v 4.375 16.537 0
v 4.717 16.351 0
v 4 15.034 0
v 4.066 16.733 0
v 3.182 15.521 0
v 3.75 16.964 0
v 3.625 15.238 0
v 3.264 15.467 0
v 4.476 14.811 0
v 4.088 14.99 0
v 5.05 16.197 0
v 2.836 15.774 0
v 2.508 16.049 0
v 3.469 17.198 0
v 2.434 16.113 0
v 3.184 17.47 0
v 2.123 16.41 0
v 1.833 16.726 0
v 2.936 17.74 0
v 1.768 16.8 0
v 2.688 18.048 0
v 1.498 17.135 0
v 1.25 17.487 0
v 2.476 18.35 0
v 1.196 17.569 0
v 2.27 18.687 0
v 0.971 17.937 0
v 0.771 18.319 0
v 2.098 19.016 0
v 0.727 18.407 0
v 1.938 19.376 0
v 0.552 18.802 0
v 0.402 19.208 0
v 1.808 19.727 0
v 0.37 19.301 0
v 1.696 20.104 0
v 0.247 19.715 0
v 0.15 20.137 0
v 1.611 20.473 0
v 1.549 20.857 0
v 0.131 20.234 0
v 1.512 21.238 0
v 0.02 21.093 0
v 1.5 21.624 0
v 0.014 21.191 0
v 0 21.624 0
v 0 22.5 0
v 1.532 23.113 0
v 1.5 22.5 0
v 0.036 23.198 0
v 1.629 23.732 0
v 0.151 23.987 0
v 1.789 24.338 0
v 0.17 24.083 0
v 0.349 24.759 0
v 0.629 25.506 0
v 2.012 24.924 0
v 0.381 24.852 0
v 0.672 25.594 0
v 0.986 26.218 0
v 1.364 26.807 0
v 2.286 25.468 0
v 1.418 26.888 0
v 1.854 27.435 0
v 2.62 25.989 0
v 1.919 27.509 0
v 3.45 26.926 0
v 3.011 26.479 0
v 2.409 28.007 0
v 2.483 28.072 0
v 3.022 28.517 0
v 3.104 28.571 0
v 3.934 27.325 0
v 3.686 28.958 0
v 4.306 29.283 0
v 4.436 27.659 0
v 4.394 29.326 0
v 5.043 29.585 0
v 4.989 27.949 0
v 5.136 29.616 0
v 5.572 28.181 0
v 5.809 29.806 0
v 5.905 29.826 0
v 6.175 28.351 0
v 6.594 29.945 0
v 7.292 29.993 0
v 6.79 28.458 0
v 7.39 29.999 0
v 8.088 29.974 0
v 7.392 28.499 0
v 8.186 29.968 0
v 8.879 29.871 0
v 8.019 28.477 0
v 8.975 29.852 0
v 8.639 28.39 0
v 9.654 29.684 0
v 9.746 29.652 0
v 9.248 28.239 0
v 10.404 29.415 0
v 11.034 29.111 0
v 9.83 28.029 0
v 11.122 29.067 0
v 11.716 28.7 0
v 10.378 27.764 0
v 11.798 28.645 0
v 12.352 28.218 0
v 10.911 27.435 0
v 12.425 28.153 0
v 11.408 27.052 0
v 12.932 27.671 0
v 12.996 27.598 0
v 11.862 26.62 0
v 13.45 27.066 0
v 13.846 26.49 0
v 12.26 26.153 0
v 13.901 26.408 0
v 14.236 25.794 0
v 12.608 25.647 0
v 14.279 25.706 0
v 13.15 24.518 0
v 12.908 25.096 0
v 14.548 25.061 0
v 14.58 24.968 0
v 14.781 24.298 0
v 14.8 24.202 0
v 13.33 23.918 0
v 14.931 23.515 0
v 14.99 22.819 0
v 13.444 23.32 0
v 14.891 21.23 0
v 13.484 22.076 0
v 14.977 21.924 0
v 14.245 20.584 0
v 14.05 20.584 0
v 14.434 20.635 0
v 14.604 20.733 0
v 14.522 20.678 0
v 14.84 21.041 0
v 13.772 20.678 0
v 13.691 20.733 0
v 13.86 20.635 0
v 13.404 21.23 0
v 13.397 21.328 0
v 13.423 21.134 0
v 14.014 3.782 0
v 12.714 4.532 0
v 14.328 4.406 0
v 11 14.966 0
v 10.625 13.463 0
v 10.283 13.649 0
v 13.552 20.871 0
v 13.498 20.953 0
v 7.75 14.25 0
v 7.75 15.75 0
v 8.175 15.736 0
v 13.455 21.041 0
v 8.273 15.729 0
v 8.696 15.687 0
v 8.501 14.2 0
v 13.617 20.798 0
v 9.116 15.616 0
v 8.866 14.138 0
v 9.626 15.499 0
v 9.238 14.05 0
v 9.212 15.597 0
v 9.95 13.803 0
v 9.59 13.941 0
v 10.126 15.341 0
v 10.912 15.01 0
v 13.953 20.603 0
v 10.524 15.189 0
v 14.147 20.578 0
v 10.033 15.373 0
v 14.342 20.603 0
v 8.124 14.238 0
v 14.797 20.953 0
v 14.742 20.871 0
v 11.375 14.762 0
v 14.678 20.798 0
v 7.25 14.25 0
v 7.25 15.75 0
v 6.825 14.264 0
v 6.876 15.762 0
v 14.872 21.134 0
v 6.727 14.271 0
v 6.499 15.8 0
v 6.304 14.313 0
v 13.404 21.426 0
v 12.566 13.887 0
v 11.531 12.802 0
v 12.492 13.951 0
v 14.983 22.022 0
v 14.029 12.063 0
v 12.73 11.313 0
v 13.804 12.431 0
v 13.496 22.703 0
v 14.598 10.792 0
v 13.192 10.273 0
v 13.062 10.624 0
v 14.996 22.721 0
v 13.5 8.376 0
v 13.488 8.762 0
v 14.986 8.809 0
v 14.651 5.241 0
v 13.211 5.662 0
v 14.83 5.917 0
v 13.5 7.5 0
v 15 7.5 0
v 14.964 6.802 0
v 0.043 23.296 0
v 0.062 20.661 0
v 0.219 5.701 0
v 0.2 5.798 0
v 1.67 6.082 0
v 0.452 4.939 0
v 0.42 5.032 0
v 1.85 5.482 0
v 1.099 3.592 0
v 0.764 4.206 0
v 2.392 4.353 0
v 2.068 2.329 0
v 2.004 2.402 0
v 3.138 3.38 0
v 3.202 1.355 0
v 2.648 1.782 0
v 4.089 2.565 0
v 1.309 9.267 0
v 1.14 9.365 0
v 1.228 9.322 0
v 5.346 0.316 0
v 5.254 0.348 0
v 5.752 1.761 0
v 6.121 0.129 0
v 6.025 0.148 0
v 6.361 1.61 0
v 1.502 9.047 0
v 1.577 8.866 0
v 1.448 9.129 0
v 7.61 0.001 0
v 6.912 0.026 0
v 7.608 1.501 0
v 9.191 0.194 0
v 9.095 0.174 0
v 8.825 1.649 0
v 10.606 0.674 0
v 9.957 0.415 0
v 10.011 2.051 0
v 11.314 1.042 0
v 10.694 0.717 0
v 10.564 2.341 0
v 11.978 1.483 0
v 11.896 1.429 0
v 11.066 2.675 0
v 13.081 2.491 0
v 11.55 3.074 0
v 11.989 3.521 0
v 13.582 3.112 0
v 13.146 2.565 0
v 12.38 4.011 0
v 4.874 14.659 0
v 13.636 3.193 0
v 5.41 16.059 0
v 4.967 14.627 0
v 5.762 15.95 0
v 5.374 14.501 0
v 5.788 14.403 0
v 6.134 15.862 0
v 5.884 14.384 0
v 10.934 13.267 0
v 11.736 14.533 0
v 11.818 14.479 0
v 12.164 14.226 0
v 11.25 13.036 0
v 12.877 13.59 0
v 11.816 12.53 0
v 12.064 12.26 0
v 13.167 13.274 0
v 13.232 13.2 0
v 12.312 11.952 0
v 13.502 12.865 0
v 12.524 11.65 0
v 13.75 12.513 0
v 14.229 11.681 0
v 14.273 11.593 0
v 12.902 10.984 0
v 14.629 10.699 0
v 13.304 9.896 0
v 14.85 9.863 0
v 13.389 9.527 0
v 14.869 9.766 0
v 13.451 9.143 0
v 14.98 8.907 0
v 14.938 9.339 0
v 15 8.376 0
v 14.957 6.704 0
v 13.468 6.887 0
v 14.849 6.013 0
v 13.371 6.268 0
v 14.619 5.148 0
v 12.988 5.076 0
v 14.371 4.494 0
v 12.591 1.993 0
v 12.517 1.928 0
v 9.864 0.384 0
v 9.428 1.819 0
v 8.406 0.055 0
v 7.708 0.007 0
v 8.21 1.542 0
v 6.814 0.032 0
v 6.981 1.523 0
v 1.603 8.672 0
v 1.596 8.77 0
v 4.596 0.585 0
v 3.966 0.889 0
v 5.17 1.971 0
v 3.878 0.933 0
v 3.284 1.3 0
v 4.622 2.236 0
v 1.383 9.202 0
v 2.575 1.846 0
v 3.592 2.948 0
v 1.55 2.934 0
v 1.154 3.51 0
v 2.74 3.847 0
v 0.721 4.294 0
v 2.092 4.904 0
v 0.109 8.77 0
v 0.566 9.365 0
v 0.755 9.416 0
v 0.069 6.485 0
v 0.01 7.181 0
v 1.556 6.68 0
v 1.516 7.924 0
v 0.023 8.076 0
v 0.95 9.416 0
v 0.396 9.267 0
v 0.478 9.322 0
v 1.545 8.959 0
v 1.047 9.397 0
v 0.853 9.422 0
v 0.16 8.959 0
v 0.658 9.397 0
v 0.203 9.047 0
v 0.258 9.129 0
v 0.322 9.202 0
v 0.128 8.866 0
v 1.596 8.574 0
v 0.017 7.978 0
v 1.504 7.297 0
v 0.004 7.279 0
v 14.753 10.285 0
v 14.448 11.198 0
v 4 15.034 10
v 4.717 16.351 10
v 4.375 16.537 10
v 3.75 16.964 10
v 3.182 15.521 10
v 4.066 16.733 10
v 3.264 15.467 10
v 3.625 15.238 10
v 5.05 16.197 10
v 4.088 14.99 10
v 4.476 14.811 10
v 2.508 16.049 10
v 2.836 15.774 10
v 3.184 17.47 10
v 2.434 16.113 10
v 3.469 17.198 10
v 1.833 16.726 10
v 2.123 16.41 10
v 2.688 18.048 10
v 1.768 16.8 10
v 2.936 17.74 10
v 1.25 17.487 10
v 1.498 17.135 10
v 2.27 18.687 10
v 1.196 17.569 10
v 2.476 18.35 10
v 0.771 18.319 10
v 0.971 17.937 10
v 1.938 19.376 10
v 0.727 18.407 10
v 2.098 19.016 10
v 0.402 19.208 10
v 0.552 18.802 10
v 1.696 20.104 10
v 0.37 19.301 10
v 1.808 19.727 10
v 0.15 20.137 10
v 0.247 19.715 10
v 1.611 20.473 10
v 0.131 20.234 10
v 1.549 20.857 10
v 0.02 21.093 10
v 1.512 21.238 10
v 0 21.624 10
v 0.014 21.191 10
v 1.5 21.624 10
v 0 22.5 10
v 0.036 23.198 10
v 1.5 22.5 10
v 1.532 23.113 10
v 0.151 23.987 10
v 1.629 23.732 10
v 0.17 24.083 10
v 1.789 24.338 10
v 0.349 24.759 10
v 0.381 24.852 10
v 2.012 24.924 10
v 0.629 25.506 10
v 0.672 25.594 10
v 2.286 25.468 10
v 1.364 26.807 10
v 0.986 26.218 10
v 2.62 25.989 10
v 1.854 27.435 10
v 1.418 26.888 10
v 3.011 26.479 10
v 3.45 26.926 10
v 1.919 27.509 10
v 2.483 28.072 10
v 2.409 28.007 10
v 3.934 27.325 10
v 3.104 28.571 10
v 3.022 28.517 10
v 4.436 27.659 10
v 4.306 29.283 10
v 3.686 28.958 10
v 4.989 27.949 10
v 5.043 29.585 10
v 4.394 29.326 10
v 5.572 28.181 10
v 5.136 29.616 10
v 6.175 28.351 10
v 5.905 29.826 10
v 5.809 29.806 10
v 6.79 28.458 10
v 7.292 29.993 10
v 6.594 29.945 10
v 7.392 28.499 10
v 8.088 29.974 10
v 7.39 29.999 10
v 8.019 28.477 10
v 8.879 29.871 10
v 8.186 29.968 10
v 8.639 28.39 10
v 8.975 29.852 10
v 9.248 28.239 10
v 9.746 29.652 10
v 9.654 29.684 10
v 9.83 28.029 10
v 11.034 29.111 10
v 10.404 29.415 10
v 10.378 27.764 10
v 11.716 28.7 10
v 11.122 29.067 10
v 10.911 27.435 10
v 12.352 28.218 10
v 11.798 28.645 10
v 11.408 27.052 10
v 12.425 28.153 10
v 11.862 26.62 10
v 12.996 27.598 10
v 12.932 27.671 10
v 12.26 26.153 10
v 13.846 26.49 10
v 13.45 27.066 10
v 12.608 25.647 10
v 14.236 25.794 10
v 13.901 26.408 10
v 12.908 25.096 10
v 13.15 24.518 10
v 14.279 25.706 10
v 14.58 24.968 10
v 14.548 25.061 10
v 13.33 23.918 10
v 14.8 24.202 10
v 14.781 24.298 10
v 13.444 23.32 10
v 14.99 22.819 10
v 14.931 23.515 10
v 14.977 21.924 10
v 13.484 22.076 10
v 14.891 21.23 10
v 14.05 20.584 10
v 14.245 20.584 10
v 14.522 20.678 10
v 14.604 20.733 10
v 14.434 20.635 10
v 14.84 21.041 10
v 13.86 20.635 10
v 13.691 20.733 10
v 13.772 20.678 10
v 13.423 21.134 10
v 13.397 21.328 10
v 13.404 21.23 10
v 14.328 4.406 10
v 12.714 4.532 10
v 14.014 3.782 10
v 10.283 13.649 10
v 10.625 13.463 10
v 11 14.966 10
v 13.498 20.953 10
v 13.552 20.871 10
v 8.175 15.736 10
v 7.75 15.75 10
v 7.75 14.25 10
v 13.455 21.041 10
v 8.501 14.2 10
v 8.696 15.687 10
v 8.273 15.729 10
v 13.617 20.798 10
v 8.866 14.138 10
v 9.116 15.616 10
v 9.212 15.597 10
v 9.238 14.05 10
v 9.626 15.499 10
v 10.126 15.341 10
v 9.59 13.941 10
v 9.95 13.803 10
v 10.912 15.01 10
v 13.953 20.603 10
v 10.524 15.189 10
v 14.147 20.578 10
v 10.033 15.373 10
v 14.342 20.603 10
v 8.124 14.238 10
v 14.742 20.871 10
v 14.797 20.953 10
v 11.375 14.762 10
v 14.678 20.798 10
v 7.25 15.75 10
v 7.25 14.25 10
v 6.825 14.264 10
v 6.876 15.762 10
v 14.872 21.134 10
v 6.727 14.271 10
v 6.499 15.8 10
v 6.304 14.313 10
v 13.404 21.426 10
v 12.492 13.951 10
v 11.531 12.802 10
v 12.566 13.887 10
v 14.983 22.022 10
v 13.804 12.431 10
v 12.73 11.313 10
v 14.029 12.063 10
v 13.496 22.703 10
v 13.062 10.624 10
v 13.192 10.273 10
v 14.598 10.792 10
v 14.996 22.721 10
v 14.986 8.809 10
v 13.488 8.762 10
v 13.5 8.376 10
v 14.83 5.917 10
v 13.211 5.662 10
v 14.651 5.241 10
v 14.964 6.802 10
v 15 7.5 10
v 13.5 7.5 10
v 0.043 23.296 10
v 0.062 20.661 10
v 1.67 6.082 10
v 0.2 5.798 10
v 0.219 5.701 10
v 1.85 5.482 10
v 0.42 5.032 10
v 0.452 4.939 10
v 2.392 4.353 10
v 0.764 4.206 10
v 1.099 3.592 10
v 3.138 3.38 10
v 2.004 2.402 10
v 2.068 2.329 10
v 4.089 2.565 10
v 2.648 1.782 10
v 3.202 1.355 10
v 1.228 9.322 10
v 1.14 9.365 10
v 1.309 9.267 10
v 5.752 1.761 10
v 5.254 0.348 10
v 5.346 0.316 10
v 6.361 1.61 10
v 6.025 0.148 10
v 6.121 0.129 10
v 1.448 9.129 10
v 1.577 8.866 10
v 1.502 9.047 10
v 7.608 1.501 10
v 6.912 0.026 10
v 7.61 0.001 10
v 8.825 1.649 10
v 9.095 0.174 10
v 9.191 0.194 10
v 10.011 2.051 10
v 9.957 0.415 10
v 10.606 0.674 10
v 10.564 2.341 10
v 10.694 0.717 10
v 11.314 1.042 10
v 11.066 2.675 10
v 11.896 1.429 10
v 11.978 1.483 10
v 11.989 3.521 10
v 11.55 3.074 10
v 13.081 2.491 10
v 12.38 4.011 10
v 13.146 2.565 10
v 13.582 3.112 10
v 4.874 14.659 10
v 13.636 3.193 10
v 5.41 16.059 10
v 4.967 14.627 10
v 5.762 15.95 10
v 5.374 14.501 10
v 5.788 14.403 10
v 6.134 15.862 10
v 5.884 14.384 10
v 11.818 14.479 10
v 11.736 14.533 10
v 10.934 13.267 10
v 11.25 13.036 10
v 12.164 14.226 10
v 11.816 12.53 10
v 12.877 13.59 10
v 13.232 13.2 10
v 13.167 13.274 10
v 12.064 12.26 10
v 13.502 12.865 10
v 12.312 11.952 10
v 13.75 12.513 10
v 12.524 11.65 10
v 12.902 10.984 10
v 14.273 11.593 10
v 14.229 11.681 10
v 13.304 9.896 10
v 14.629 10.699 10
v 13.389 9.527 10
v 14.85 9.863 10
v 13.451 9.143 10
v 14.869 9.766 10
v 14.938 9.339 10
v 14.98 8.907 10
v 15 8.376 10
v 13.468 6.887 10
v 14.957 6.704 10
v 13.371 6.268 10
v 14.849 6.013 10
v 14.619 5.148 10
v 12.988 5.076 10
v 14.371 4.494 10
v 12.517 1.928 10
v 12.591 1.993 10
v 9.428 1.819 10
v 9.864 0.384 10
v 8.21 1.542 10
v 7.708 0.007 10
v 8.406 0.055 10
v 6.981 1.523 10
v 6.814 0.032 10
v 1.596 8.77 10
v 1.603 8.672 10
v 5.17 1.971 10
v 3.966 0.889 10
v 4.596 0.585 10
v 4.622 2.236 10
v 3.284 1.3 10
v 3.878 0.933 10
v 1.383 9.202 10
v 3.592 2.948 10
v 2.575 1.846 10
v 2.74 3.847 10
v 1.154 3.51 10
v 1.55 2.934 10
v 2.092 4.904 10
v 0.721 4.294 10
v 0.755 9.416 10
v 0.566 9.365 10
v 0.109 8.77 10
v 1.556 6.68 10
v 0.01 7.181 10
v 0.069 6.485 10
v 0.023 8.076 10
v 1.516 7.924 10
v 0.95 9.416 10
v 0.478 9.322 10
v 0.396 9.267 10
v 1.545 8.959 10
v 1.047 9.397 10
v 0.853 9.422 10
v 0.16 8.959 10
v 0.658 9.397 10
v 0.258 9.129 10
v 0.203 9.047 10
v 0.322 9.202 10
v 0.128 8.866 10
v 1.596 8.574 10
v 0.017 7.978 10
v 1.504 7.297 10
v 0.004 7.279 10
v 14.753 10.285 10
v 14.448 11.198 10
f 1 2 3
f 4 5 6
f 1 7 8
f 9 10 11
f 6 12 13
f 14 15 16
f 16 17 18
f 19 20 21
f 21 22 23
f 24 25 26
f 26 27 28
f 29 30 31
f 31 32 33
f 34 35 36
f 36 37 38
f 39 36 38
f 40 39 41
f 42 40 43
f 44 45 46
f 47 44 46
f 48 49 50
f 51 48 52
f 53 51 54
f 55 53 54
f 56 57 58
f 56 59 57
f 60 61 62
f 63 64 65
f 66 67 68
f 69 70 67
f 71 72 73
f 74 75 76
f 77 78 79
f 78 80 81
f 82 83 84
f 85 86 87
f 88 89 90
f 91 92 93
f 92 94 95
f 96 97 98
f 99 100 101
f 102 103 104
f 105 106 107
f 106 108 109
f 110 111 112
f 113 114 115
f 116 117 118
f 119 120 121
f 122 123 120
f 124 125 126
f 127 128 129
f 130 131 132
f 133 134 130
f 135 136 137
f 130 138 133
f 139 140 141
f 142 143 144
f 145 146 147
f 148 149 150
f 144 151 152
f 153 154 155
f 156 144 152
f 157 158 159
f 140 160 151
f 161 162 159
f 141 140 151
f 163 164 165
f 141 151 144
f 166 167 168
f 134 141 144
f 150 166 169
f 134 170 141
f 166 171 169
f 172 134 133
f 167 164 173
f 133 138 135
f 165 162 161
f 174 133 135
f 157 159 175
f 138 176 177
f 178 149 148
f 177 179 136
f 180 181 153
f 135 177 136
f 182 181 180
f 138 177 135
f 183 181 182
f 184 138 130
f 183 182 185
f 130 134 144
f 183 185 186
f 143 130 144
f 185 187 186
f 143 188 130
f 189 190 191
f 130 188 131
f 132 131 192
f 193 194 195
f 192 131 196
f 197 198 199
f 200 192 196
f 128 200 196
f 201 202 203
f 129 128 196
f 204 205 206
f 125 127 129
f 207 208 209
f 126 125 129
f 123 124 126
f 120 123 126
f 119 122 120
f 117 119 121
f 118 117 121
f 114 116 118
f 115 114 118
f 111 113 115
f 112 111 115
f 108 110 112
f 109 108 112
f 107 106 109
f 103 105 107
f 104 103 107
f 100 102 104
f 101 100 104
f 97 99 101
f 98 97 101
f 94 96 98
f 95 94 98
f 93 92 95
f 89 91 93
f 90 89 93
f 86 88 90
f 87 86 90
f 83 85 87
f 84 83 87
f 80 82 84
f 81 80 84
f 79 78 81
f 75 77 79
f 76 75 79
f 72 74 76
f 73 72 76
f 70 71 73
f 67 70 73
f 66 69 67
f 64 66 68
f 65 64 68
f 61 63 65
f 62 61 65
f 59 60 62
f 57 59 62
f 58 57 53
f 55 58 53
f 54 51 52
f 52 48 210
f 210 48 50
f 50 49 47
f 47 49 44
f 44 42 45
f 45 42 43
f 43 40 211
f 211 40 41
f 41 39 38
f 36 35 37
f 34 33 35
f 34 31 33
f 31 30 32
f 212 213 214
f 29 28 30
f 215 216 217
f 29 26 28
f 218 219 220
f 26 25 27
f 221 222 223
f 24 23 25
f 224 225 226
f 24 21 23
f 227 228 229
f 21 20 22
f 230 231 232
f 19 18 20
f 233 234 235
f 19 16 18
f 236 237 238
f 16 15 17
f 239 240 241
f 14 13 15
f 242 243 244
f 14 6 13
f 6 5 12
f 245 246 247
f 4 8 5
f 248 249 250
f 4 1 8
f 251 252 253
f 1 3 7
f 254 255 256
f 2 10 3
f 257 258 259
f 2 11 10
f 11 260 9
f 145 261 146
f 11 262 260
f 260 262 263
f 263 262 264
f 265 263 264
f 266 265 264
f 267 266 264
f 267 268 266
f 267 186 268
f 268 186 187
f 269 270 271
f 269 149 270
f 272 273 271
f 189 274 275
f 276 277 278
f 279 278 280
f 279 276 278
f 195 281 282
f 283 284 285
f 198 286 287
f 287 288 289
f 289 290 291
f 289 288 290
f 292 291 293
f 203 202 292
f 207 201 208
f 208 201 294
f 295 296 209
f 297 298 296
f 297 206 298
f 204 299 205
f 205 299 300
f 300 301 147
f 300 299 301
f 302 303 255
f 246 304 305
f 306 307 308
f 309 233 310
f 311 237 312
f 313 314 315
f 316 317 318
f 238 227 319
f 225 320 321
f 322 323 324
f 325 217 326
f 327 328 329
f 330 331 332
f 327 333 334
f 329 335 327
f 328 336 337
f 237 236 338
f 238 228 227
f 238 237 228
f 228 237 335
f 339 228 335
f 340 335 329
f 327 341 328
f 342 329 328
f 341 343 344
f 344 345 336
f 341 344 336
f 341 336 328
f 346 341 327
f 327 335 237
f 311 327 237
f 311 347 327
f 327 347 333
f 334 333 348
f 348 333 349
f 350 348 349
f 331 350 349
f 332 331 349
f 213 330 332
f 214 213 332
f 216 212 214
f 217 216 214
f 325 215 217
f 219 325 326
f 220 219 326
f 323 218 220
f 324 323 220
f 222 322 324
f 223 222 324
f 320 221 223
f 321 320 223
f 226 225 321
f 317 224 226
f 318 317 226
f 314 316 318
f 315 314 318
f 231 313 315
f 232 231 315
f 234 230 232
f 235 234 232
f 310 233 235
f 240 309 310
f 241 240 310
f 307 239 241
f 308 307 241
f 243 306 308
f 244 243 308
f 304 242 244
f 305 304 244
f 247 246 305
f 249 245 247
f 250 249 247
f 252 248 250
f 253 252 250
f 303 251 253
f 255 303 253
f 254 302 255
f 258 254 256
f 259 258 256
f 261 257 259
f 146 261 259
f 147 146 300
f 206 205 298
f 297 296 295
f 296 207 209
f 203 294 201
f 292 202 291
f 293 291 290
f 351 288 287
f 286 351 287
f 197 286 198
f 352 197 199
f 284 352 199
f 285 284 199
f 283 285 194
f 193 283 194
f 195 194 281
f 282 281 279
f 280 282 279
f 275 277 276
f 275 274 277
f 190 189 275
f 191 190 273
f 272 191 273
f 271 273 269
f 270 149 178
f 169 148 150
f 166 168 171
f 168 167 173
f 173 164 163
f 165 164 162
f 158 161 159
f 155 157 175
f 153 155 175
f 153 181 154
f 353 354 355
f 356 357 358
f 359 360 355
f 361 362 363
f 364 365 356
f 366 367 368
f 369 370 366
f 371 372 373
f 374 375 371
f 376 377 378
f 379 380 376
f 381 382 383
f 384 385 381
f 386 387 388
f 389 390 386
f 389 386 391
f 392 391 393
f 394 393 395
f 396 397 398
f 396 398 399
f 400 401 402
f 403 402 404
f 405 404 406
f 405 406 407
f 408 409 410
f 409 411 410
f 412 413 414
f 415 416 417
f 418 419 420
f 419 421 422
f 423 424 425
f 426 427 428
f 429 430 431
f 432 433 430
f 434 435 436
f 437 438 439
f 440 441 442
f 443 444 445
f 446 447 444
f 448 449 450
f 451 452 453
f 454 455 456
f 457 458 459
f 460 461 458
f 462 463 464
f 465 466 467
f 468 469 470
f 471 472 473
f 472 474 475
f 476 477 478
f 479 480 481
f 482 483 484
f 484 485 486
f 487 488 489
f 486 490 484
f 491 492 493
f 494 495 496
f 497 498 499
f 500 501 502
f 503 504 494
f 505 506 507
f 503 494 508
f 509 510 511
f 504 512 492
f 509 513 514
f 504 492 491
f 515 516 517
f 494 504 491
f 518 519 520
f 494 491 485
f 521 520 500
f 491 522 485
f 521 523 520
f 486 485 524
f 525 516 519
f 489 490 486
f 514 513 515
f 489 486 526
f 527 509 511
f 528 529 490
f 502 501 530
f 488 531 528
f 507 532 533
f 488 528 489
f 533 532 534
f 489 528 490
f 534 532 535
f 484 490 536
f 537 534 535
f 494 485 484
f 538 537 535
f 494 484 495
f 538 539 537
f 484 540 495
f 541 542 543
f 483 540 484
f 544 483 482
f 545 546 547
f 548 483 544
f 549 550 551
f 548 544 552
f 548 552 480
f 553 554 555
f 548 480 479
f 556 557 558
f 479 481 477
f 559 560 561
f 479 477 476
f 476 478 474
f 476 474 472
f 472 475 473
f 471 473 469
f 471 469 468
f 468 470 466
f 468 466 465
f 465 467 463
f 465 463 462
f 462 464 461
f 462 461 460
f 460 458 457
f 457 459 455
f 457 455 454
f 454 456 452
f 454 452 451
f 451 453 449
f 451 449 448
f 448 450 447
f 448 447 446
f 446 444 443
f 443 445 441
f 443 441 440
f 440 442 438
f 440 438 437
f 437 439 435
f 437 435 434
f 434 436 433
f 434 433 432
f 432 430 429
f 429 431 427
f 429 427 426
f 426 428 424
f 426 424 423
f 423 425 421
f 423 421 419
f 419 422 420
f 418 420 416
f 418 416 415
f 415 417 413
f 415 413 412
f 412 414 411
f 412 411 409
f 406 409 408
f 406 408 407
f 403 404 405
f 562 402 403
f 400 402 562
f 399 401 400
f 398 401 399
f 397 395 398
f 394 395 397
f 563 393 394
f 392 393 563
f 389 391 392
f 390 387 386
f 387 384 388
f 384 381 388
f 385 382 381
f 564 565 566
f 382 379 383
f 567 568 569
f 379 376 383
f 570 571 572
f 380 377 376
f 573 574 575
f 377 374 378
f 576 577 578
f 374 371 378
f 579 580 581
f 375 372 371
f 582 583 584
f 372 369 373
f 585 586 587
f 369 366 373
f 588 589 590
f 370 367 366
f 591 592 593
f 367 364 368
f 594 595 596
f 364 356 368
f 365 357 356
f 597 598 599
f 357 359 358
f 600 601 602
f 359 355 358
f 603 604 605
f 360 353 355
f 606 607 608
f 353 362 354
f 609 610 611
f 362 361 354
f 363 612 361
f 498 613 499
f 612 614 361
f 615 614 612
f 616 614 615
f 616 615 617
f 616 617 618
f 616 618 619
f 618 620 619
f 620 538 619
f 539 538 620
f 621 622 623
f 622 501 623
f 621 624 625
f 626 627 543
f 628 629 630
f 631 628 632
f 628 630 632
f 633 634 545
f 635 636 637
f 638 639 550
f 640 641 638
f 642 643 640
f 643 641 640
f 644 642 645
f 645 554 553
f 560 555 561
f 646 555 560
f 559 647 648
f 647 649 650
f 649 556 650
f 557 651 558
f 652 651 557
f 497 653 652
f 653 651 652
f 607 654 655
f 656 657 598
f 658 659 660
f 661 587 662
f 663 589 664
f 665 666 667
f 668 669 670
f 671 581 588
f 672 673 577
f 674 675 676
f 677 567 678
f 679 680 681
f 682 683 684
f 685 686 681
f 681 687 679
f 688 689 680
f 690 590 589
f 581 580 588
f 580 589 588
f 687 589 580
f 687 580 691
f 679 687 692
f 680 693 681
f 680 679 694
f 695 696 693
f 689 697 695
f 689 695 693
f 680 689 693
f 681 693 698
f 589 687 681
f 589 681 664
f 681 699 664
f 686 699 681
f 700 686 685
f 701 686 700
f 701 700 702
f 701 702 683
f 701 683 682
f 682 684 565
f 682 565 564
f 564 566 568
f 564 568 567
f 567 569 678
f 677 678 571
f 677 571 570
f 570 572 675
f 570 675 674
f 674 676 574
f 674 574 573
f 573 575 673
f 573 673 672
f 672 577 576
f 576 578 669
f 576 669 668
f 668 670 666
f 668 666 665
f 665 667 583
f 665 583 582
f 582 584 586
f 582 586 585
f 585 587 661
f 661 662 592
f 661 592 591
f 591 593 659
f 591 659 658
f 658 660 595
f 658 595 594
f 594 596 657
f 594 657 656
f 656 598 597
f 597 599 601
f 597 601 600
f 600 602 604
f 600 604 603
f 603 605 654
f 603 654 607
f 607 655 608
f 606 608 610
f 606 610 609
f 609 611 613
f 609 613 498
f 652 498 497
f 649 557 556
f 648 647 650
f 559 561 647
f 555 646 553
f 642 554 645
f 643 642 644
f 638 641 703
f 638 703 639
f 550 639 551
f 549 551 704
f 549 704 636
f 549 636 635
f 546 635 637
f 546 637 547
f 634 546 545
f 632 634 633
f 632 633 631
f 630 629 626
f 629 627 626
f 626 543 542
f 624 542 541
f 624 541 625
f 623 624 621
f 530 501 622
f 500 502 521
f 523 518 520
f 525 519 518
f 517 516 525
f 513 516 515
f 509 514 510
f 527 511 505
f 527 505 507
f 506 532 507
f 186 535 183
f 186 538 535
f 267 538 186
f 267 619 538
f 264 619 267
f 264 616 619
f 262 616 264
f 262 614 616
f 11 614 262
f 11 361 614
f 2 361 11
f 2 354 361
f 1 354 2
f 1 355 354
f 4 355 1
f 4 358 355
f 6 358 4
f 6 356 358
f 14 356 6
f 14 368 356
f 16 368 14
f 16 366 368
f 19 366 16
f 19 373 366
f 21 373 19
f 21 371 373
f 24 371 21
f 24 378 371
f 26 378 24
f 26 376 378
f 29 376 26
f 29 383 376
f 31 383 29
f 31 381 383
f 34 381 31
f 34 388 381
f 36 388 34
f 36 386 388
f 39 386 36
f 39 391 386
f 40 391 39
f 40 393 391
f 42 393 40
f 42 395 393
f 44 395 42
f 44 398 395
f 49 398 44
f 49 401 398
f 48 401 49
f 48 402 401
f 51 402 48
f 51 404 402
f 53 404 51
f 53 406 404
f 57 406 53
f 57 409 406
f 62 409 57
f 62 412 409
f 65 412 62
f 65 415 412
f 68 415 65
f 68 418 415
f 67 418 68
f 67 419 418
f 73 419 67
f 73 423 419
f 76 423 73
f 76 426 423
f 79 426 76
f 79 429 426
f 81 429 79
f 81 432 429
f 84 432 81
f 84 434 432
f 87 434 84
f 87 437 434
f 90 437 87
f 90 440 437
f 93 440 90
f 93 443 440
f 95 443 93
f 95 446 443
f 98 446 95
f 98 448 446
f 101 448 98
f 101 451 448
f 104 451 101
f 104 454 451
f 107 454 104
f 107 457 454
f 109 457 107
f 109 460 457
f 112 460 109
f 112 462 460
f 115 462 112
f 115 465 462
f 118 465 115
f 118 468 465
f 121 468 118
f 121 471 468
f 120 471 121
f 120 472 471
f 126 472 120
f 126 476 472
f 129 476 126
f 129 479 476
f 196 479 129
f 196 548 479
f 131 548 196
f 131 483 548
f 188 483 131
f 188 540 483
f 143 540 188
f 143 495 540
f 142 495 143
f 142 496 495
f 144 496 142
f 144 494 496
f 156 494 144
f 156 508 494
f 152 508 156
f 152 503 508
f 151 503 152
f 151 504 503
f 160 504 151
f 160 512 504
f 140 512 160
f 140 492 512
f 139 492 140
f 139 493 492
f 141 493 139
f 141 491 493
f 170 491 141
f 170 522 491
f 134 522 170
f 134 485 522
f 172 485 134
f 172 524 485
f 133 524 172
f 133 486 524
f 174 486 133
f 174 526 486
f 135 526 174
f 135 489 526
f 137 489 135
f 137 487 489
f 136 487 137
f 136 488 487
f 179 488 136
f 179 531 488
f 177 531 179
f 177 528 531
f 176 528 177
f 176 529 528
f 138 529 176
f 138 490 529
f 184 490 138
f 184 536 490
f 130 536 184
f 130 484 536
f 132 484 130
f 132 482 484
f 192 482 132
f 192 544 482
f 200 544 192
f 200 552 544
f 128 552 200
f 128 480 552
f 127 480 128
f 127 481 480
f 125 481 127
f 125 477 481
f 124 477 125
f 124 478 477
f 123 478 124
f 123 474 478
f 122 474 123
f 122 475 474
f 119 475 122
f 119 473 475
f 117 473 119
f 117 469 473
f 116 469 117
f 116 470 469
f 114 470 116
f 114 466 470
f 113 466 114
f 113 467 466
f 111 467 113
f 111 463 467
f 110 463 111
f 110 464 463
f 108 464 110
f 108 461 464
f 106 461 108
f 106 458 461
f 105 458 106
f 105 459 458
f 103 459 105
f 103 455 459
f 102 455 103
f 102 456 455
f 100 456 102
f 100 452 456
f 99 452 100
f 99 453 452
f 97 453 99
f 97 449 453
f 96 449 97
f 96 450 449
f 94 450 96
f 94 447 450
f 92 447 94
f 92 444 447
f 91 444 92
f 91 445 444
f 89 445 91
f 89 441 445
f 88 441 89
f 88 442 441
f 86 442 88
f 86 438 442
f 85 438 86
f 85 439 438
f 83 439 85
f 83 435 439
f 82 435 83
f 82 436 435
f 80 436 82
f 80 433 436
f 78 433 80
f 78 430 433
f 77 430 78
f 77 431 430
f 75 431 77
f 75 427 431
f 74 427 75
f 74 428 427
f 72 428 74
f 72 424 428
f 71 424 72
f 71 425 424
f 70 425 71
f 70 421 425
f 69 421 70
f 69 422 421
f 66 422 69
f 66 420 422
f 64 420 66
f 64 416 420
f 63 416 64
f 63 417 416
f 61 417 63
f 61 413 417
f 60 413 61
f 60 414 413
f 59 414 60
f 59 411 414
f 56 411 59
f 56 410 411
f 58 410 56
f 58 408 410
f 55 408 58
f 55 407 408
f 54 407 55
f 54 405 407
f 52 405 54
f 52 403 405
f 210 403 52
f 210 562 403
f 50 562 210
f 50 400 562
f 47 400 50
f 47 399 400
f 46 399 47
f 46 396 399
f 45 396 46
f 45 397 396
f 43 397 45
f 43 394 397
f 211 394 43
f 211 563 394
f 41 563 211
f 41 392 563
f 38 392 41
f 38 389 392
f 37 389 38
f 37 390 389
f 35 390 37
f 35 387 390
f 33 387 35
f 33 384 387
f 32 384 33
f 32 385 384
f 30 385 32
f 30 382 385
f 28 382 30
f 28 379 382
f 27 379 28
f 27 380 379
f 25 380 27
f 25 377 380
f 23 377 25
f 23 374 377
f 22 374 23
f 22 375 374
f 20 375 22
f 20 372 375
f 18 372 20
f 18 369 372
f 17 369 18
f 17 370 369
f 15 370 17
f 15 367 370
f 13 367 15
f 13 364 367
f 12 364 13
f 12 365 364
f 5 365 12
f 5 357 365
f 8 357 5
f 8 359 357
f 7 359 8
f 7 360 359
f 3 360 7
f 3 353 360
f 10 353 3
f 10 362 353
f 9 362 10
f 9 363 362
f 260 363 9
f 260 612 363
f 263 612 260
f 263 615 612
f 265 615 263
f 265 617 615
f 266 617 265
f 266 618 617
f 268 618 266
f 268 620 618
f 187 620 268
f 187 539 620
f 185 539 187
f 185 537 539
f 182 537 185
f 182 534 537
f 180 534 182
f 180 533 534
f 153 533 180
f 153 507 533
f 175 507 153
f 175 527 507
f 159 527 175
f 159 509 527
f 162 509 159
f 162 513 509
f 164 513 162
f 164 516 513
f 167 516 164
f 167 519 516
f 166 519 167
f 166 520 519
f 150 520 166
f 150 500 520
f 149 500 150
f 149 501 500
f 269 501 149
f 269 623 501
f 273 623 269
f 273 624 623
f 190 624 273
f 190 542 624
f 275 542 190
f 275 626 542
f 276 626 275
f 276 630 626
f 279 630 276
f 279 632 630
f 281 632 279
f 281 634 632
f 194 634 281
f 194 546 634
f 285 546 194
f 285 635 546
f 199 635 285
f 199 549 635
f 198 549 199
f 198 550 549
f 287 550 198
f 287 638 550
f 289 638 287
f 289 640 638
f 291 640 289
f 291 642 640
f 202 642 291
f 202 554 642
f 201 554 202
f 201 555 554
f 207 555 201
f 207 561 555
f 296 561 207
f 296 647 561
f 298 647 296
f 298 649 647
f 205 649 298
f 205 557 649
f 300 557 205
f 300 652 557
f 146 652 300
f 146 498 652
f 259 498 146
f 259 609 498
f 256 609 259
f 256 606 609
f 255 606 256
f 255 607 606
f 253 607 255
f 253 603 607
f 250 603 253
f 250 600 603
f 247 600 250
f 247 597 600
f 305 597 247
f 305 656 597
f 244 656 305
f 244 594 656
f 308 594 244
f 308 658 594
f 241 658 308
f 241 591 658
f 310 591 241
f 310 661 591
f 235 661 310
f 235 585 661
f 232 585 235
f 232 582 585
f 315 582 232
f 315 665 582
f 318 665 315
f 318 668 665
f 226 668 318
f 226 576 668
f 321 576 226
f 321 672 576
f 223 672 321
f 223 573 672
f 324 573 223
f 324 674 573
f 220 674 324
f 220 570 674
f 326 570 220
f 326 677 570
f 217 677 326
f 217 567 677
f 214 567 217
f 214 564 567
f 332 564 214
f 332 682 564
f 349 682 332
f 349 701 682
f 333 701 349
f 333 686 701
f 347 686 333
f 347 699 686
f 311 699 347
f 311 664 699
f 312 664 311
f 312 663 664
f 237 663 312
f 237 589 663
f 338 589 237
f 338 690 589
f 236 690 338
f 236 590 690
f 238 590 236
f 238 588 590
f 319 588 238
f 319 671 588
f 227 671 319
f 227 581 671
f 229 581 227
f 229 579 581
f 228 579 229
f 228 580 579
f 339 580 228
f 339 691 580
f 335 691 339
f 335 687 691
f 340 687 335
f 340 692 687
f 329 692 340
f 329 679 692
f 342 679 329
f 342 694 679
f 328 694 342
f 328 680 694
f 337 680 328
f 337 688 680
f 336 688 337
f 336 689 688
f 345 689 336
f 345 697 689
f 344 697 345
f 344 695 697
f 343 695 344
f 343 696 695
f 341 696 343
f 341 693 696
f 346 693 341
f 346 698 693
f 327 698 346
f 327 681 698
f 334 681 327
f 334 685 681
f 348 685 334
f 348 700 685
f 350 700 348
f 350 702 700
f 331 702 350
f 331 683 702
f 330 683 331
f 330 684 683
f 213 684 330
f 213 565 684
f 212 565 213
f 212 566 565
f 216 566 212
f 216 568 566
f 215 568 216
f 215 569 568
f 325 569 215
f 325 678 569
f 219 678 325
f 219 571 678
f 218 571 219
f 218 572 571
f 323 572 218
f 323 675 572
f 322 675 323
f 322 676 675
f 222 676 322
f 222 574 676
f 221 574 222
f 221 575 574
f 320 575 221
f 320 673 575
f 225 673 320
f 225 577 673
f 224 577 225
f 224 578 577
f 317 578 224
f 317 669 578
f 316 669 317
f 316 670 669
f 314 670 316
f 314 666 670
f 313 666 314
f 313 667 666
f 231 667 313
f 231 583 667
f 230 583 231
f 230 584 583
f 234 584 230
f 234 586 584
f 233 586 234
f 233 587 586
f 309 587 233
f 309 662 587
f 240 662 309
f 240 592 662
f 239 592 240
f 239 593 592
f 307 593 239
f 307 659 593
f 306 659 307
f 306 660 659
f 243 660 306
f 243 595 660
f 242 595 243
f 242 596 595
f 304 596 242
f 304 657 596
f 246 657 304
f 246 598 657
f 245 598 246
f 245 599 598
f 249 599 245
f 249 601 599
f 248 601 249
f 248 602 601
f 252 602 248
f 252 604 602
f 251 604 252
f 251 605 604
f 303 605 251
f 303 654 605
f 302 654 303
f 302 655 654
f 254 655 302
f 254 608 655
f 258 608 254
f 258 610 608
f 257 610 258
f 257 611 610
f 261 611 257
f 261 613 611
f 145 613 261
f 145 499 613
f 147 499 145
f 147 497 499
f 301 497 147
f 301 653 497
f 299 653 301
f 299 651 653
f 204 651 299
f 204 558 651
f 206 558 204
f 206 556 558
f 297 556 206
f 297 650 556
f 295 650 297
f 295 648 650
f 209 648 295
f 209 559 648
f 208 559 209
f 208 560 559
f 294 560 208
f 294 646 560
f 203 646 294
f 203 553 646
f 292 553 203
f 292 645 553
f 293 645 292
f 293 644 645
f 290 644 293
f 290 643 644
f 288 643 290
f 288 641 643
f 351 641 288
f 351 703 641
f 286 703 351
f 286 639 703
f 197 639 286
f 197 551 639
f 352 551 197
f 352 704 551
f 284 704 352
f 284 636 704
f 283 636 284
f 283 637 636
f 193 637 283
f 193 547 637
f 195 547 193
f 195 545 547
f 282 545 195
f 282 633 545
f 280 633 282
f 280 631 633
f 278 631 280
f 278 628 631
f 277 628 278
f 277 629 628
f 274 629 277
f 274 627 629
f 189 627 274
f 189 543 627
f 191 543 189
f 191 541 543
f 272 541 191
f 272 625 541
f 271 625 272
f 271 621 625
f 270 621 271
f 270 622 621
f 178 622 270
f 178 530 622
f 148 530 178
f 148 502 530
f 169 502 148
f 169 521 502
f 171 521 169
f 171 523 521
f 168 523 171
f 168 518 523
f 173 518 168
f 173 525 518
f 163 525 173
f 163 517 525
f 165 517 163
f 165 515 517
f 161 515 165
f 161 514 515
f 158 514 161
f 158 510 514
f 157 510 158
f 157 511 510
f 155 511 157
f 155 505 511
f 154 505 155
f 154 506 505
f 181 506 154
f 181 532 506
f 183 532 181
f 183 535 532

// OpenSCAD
// S-shaped cable organizer, extruded 10 mm.
// Purpose: spring clip that holds two cables. The top hook is loaded from
// the right, the bottom hook from the left. Cables slide in sideways past
// the round-capped tips; the hook mouths hold them.
// Notes: The S centerline is one tangent- and curvature-matched chain:
// hook arc, quarter-ellipse transition, flat middle, mirrored transition,
// hook arc. The transition span is derived so its curvature equals the
// hook arc curvature at the junction (G2 continuity), which removes the
// visible bend-rate crease on the strip boundary.
// The hook tip angle (degrees) is the master mouth control.
// Builtin OpenSCAD only, no library needed.

// ================= PARAMETERS =================
// Overall size and extrusion
width_x     = 15.0;   // x extent of the bounding box (mm)
height_y    = 30.0;   // y extent of the bounding box (mm)
depth_z     = 10.0;   // extrusion depth (mm)

// Strip
strip_width = 1.5;    // constant thickness of the S strip (mm)

// Hook tip angle in degrees, measured down from the hook's wide side.
// This is the master control for both mouth gaps; larger angle =
// smaller gaps. 10 deg gives about a 4.4 mm gap at the current size.
// Keep within roughly -40 (very wide open) to +20 (nearly closed).
tip_deg     = 10;

// Derived centerline geometry
strip_r = strip_width / 2;
cx      = width_x / 2;                        // hook arc center x
hook_r  = (width_x - strip_width) / 2;        // = 6.5, hook arc radius
cy_top  = height_y - strip_r - hook_r;        // = 22.5, top hook center y
cy_bot  = strip_r + hook_r;                   // = 7.5, bottom hook center y
mid_y   = height_y / 2;                       // = 15.0, middle centerline y

// Flat middle length in mm. The transitions stay curvature-matched for
// every value in range: their horizontal span takes the width remainder,
// their height shrinks to keep the bend rate equal to the hook arc, and
// any leftover height becomes a short vertical straight on each hook
// side. Valid range is echoed as a warning if exceeded (clamped).
// At the current size the matched floor is below 0 (see min_mid), so
// every value renders smooth; larger = straighter middle, smaller
// transitions.
mid_flat    = 0.5;

// Render resolution — coarse in preview (fast), fine in render/export.
// $preview is true in OpenCSG preview (F5 and PNG without --render),
// false in render mode (F6 and STL/DXF/SVG export). This keeps the high
// quality $fs/$fa for final renders while previews stay responsive.
$fs = $preview ? 1 : 0.1;  // Minimum facet size
$fa = $preview ? 12 : 1;   // Minimum angle (degrees)

// Derived transition geometry
side_room = cy_top - mid_y;                                  // = 7.5, height available per transition
min_mid   = width_x - 2 * strip_r - 2 * side_room * side_room / hook_r; // = -4.3 here: no floor at this size
max_mid   = width_x - 2 * strip_r;                           // = 13, transitions fully vanished
mid_eff   = min(max(mid_flat, min_mid), max_mid);
ease_dx   = (width_x - 2 * strip_r - mid_eff) / 2;           // horizontal span of each transition
ease_dy   = sqrt(ease_dx * hook_r);                          // transition height, keeps bend rate = 1 / hook_r
straight_v = side_room - ease_dy;                            // leftover: short vertical straight per side
mid_x_l   = strip_r + ease_dx;                               // left end of the flat middle
mid_x_r   = width_x - strip_r - ease_dx;                     // right end of the flat middle

if (mid_flat != mid_eff)
    echo(str("WARNING: mid_flat ", mid_flat, " is outside the valid range [",
             min_mid, ", ", max_mid, "]; using ", mid_eff, " instead."));

// Informational: resulting mouth gap in mm, identical on both sides.
mouth_mm = (cy_top - mid_y - 2 * strip_r) - hook_r * sin(tip_deg);

echo(str("Mouth gap: ", mouth_mm, " mm on both sides"));

// ================= HELPER =================
// Sample a circular arc including both endpoints, about 6 deg resolution.
function arc(c, r, a0, a1) =
    let(n = max(1, ceil(abs(a1 - a0) / 6)))
    [for (i = [0 : n])
        [c.x + r * cos(a0 + (a1 - a0) * i / n),
         c.y + r * sin(a0 + (a1 - a0) * i / n)]];

// Quarter-ellipse transition: vertical tangent at the start, horizontal
// tangent at the end (pure sin/cos sampling).
function ease_vh(p0, dx, dy, n = 24) =
    [for (i = [0 : n])
        [p0.x + dx * (1 - cos(90 * i / n)),
         p0.y + dy * sin(90 * i / n)]];

// Mirrored variant: horizontal tangent at the start, vertical tangent
// at the end (sin/cos roles swapped).
function ease_hv(p0, dx, dy, n = 24) =
    [for (i = [0 : n])
        [p0.x + dx * sin(90 * i / n),
         p0.y + dy * (1 - cos(90 * i / n))]];

// ================= MAIN MODULE =================
module s_cable_organizer() {
    // Optional short vertical straights between hook side and transition;
    // present whenever mid_flat is above its minimum (leftover height).
    vert_l = straight_v > 0.001 ? [[strip_r, cy_top - straight_v]] : [];
    vert_r = straight_v > 0.001 ? [[width_x - strip_r, cy_bot]] : [];

    // Sampled centerline of the S, top tip to bottom tip. Every piece
    // starts where the previous one ends and has a matching tangent;
    // the hook-to-transition junctions also match in curvature.
    path = concat(
        // top hook arc, tip -> over the apex -> to the left side
        arc([cx, cy_top], hook_r, -tip_deg, 180),
        vert_l,
        // quarter-ellipse transition, vertical -> horizontal
        ease_vh([strip_r, cy_top - straight_v], ease_dx, -ease_dy),
        // flat middle (mid_flat long)
        [[mid_x_r, mid_y]],
        // mirrored transition, horizontal -> vertical
        ease_hv([mid_x_r, mid_y], ease_dx, -ease_dy),
        vert_r,
        // bottom hook arc, right side -> under the apex -> tip.
        // End angle -(180 + tip_deg) mirrors the top tip exactly, so
        // both mouth gaps are identical for any tip angle.
        arc([cx, cy_bot], hook_r, 0, -(180 + tip_deg))
    );

    linear_extrude(height = depth_z)
        stroke2d(path, strip_r);
}

// Stroke a polyline as a constant-width strip with round end caps:
// hull chains of circles between consecutive path points.
module stroke2d(pts, r) {
    for (i = [0 : len(pts) - 2])
        hull() {
            translate(pts[i])     circle(r);
            translate(pts[i + 1]) circle(r);
        }
}

// ================= INSTANTIATION =================
s_cable_organizer();
